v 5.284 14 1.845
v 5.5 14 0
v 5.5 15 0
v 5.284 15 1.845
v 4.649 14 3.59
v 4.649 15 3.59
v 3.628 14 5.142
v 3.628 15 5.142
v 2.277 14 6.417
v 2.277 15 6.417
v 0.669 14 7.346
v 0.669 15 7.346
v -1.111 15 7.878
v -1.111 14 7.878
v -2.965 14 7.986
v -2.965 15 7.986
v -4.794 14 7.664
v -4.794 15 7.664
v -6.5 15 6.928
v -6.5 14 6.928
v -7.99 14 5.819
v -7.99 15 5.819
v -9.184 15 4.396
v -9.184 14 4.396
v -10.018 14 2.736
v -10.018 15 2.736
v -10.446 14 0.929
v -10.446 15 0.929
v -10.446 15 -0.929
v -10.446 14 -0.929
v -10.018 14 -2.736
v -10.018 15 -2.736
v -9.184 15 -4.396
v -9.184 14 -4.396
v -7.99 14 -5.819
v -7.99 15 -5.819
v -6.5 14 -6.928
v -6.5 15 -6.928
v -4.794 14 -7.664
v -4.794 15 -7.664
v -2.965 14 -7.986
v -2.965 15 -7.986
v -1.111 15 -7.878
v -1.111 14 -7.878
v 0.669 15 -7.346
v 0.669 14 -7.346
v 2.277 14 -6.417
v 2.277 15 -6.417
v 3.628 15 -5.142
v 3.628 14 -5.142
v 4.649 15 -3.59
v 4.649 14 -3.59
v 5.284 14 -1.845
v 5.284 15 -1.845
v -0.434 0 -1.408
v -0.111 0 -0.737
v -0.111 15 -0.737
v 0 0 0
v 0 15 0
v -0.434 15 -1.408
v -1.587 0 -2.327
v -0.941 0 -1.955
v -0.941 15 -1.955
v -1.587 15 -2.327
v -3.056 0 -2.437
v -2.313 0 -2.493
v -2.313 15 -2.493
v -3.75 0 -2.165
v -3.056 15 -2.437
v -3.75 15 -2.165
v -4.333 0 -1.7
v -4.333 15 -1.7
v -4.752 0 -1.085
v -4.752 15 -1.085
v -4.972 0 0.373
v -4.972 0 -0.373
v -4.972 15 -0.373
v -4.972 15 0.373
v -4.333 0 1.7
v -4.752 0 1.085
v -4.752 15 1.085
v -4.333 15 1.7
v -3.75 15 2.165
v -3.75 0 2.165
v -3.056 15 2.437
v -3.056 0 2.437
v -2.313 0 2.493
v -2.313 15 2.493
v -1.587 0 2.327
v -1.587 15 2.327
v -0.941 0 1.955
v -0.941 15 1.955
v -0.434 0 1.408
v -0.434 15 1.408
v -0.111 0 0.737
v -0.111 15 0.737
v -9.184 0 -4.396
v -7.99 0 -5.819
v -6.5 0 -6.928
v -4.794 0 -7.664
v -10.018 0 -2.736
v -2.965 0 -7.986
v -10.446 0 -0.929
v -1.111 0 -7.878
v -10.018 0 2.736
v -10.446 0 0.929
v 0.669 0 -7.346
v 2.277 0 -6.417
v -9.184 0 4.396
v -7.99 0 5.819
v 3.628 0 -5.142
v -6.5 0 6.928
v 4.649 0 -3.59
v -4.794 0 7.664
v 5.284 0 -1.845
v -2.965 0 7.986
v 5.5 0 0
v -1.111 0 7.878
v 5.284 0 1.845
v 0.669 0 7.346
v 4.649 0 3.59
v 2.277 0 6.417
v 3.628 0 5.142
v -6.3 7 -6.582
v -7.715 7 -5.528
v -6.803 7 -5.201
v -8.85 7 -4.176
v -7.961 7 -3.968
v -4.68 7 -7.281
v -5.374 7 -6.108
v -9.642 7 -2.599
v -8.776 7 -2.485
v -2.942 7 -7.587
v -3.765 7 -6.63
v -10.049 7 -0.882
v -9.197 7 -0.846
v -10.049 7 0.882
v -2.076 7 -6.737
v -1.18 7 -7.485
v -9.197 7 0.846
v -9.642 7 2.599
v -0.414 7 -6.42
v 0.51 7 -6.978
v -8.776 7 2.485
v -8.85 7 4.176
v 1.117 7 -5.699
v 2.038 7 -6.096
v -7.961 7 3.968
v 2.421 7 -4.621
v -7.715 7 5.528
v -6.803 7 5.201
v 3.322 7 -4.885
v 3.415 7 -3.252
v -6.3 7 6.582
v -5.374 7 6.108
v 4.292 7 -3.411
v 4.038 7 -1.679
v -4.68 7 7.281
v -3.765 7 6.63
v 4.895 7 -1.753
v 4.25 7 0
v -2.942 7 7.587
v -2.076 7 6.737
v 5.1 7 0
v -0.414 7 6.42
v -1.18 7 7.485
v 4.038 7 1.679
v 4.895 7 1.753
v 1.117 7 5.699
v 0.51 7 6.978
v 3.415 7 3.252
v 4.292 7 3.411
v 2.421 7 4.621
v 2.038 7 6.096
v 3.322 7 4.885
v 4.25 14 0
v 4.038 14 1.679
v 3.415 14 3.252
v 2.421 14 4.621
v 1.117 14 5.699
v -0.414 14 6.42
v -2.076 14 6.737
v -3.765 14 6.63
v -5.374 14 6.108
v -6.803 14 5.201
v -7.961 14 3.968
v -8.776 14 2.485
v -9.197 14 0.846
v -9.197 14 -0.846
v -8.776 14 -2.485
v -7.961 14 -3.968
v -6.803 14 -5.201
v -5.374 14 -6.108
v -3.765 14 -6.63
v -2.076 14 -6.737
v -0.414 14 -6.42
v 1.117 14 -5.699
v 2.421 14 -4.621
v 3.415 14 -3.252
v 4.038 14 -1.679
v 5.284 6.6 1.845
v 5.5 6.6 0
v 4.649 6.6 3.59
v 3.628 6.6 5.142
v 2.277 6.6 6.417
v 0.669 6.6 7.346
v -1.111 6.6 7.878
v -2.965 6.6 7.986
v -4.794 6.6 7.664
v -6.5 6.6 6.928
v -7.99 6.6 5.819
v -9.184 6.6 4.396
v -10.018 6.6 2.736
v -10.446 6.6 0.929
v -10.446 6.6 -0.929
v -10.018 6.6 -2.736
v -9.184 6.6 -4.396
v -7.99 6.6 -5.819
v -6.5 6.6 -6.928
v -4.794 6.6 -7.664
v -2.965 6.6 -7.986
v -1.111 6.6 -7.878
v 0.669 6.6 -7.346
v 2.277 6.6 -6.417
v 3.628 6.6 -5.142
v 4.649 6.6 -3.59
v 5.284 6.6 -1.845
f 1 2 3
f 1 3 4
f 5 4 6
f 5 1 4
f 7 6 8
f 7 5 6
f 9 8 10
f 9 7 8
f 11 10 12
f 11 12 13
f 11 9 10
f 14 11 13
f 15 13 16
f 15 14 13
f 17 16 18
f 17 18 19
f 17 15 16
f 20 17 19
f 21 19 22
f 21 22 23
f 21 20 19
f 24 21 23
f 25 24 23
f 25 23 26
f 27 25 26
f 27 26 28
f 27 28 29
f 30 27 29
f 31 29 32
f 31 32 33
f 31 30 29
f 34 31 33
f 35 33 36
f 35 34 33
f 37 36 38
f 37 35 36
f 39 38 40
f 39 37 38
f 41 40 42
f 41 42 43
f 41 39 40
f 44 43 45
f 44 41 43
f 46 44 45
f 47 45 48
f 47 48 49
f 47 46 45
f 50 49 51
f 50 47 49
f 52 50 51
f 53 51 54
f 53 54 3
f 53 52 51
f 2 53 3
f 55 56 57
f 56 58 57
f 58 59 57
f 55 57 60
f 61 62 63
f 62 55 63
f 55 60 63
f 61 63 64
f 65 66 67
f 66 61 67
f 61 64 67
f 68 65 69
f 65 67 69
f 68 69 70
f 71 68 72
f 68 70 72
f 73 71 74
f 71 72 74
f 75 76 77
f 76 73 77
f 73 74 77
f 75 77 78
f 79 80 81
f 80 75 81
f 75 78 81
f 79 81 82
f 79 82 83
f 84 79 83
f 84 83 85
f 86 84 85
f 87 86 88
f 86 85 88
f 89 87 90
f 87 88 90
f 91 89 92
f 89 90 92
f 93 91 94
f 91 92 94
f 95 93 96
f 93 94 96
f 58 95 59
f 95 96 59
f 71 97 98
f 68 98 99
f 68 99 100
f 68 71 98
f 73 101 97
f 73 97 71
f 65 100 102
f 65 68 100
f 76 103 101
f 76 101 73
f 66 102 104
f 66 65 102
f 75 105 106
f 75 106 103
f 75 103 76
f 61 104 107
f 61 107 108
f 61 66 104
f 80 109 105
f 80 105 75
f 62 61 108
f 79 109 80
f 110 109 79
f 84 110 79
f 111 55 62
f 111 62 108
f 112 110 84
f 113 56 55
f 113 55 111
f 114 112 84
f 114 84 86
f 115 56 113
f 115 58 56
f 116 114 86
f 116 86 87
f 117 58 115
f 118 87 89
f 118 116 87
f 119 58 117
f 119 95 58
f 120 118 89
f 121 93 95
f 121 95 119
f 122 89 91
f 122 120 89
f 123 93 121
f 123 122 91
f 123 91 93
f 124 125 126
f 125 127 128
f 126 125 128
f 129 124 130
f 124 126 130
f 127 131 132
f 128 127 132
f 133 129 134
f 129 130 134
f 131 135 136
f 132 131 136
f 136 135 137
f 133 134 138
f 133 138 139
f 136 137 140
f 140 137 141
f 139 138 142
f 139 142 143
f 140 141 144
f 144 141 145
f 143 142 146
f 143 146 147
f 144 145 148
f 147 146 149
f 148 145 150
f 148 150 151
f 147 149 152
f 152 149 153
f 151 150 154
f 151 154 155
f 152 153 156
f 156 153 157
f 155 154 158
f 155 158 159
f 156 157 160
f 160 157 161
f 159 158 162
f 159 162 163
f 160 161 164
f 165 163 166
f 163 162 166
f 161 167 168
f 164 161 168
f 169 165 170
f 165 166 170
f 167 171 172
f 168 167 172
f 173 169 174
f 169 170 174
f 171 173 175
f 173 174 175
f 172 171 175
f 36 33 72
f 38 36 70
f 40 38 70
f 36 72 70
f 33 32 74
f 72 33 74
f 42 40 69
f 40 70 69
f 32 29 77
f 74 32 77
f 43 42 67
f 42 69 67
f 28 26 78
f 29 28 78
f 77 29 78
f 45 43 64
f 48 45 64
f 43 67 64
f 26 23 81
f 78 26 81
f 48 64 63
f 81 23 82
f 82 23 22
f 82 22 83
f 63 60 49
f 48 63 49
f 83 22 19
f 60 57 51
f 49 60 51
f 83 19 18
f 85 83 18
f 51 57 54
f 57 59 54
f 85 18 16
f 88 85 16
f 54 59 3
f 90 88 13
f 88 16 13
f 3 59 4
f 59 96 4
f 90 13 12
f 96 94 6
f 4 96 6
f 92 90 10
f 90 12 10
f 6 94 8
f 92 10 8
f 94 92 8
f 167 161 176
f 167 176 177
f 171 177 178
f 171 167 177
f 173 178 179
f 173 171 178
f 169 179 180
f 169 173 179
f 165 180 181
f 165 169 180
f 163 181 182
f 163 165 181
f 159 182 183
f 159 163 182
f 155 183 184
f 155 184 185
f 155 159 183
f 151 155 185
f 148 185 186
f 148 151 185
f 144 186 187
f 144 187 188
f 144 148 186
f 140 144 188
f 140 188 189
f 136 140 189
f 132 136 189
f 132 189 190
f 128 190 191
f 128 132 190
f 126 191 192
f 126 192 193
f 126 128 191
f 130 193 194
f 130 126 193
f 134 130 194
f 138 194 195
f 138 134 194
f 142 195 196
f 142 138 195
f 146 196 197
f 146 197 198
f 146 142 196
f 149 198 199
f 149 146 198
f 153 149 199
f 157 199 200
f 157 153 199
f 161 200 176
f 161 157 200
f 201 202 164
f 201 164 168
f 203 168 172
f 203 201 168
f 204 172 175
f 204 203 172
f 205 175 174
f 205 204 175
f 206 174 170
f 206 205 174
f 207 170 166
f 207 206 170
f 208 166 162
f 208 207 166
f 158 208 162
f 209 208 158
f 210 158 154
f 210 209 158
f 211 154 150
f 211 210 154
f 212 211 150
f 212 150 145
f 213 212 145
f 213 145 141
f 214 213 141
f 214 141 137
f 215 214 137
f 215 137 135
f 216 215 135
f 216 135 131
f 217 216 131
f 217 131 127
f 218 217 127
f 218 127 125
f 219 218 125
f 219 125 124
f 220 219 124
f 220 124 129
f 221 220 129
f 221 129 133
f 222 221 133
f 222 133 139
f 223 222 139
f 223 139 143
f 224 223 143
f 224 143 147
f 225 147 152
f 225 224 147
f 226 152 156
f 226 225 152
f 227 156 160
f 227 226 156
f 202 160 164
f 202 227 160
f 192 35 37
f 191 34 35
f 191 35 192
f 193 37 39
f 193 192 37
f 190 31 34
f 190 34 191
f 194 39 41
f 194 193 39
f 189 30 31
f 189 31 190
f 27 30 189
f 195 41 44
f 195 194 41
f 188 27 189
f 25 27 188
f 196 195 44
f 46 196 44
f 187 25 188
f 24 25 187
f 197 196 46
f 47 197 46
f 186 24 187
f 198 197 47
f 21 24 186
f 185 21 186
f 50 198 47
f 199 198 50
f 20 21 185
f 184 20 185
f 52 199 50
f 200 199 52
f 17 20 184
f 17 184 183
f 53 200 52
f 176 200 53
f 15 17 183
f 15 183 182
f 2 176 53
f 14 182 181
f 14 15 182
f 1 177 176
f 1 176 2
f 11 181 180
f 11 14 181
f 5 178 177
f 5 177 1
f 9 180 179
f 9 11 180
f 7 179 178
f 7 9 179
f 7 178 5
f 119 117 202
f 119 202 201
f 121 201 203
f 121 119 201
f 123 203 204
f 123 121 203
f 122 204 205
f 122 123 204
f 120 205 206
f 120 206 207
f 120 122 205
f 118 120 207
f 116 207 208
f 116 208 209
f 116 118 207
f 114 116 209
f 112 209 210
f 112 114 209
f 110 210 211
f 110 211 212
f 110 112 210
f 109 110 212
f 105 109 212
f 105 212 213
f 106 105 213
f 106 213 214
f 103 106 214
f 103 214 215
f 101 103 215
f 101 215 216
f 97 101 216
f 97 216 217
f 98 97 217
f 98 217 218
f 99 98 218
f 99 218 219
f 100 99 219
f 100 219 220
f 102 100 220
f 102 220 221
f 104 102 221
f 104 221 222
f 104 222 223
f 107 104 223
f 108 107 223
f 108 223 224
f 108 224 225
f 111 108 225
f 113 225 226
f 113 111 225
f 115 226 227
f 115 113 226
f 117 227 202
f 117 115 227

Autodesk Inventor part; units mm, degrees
ref_plane "YZ Plane" through (0, 0, 0) normal (1, 0, 0) x (0, 1, 0)
ref_plane "XZ Plane" through (0, 0, 0) normal (0, 1, 0) x (-1, 0, 0)
ref_plane "XY Plane" through (0, 0, 0) normal (0, 0, 1) x (1, 0, 0)
sketch "Sketch1" plane through (0, 0, 0) normal (0, 0, 1) x (1, 0, 0)
  line L0 (0, 0) -> (0, 15)
  line L1 (0, 15) -> (5.5, 15)
  line L2 (5.5, 15) -> (5.5, 14)
  line L3 (5.5, 14) -> (4.25, 14)
  line L4 (4.25, 14) -> (4.25, 7)
  line L5 (4.25, 7) -> (5.1, 7)
  line L6 (5.5, 6.6) -> (5.5, 0)
  line L7 (5.5, 0) -> (0, 0)
  line L8 (-2.5, 11.781) -> (-2.5, 3.2351)
  line L9 (5.5, 6.6) -> (5.1, 7)
  point P0 (5.5, 7)
  dimension "d0" = 5.5
  dimension "d1" = 7
  dimension "d2" = 7
  dimension "d4" = 2.5
  dimension "d6" = 15
  dimension "d7" = 4.25
  dimension "d8" = 0.4
  dimension "d9" = 0.4
revolve "Revolution2" add sketch "Sketch1" angle 360 about axis through (-2.5, 11.781, 0) along (0, -1, 0)
equation "\"d9\" = d8"
properties part number "gt2_20_pulley"
